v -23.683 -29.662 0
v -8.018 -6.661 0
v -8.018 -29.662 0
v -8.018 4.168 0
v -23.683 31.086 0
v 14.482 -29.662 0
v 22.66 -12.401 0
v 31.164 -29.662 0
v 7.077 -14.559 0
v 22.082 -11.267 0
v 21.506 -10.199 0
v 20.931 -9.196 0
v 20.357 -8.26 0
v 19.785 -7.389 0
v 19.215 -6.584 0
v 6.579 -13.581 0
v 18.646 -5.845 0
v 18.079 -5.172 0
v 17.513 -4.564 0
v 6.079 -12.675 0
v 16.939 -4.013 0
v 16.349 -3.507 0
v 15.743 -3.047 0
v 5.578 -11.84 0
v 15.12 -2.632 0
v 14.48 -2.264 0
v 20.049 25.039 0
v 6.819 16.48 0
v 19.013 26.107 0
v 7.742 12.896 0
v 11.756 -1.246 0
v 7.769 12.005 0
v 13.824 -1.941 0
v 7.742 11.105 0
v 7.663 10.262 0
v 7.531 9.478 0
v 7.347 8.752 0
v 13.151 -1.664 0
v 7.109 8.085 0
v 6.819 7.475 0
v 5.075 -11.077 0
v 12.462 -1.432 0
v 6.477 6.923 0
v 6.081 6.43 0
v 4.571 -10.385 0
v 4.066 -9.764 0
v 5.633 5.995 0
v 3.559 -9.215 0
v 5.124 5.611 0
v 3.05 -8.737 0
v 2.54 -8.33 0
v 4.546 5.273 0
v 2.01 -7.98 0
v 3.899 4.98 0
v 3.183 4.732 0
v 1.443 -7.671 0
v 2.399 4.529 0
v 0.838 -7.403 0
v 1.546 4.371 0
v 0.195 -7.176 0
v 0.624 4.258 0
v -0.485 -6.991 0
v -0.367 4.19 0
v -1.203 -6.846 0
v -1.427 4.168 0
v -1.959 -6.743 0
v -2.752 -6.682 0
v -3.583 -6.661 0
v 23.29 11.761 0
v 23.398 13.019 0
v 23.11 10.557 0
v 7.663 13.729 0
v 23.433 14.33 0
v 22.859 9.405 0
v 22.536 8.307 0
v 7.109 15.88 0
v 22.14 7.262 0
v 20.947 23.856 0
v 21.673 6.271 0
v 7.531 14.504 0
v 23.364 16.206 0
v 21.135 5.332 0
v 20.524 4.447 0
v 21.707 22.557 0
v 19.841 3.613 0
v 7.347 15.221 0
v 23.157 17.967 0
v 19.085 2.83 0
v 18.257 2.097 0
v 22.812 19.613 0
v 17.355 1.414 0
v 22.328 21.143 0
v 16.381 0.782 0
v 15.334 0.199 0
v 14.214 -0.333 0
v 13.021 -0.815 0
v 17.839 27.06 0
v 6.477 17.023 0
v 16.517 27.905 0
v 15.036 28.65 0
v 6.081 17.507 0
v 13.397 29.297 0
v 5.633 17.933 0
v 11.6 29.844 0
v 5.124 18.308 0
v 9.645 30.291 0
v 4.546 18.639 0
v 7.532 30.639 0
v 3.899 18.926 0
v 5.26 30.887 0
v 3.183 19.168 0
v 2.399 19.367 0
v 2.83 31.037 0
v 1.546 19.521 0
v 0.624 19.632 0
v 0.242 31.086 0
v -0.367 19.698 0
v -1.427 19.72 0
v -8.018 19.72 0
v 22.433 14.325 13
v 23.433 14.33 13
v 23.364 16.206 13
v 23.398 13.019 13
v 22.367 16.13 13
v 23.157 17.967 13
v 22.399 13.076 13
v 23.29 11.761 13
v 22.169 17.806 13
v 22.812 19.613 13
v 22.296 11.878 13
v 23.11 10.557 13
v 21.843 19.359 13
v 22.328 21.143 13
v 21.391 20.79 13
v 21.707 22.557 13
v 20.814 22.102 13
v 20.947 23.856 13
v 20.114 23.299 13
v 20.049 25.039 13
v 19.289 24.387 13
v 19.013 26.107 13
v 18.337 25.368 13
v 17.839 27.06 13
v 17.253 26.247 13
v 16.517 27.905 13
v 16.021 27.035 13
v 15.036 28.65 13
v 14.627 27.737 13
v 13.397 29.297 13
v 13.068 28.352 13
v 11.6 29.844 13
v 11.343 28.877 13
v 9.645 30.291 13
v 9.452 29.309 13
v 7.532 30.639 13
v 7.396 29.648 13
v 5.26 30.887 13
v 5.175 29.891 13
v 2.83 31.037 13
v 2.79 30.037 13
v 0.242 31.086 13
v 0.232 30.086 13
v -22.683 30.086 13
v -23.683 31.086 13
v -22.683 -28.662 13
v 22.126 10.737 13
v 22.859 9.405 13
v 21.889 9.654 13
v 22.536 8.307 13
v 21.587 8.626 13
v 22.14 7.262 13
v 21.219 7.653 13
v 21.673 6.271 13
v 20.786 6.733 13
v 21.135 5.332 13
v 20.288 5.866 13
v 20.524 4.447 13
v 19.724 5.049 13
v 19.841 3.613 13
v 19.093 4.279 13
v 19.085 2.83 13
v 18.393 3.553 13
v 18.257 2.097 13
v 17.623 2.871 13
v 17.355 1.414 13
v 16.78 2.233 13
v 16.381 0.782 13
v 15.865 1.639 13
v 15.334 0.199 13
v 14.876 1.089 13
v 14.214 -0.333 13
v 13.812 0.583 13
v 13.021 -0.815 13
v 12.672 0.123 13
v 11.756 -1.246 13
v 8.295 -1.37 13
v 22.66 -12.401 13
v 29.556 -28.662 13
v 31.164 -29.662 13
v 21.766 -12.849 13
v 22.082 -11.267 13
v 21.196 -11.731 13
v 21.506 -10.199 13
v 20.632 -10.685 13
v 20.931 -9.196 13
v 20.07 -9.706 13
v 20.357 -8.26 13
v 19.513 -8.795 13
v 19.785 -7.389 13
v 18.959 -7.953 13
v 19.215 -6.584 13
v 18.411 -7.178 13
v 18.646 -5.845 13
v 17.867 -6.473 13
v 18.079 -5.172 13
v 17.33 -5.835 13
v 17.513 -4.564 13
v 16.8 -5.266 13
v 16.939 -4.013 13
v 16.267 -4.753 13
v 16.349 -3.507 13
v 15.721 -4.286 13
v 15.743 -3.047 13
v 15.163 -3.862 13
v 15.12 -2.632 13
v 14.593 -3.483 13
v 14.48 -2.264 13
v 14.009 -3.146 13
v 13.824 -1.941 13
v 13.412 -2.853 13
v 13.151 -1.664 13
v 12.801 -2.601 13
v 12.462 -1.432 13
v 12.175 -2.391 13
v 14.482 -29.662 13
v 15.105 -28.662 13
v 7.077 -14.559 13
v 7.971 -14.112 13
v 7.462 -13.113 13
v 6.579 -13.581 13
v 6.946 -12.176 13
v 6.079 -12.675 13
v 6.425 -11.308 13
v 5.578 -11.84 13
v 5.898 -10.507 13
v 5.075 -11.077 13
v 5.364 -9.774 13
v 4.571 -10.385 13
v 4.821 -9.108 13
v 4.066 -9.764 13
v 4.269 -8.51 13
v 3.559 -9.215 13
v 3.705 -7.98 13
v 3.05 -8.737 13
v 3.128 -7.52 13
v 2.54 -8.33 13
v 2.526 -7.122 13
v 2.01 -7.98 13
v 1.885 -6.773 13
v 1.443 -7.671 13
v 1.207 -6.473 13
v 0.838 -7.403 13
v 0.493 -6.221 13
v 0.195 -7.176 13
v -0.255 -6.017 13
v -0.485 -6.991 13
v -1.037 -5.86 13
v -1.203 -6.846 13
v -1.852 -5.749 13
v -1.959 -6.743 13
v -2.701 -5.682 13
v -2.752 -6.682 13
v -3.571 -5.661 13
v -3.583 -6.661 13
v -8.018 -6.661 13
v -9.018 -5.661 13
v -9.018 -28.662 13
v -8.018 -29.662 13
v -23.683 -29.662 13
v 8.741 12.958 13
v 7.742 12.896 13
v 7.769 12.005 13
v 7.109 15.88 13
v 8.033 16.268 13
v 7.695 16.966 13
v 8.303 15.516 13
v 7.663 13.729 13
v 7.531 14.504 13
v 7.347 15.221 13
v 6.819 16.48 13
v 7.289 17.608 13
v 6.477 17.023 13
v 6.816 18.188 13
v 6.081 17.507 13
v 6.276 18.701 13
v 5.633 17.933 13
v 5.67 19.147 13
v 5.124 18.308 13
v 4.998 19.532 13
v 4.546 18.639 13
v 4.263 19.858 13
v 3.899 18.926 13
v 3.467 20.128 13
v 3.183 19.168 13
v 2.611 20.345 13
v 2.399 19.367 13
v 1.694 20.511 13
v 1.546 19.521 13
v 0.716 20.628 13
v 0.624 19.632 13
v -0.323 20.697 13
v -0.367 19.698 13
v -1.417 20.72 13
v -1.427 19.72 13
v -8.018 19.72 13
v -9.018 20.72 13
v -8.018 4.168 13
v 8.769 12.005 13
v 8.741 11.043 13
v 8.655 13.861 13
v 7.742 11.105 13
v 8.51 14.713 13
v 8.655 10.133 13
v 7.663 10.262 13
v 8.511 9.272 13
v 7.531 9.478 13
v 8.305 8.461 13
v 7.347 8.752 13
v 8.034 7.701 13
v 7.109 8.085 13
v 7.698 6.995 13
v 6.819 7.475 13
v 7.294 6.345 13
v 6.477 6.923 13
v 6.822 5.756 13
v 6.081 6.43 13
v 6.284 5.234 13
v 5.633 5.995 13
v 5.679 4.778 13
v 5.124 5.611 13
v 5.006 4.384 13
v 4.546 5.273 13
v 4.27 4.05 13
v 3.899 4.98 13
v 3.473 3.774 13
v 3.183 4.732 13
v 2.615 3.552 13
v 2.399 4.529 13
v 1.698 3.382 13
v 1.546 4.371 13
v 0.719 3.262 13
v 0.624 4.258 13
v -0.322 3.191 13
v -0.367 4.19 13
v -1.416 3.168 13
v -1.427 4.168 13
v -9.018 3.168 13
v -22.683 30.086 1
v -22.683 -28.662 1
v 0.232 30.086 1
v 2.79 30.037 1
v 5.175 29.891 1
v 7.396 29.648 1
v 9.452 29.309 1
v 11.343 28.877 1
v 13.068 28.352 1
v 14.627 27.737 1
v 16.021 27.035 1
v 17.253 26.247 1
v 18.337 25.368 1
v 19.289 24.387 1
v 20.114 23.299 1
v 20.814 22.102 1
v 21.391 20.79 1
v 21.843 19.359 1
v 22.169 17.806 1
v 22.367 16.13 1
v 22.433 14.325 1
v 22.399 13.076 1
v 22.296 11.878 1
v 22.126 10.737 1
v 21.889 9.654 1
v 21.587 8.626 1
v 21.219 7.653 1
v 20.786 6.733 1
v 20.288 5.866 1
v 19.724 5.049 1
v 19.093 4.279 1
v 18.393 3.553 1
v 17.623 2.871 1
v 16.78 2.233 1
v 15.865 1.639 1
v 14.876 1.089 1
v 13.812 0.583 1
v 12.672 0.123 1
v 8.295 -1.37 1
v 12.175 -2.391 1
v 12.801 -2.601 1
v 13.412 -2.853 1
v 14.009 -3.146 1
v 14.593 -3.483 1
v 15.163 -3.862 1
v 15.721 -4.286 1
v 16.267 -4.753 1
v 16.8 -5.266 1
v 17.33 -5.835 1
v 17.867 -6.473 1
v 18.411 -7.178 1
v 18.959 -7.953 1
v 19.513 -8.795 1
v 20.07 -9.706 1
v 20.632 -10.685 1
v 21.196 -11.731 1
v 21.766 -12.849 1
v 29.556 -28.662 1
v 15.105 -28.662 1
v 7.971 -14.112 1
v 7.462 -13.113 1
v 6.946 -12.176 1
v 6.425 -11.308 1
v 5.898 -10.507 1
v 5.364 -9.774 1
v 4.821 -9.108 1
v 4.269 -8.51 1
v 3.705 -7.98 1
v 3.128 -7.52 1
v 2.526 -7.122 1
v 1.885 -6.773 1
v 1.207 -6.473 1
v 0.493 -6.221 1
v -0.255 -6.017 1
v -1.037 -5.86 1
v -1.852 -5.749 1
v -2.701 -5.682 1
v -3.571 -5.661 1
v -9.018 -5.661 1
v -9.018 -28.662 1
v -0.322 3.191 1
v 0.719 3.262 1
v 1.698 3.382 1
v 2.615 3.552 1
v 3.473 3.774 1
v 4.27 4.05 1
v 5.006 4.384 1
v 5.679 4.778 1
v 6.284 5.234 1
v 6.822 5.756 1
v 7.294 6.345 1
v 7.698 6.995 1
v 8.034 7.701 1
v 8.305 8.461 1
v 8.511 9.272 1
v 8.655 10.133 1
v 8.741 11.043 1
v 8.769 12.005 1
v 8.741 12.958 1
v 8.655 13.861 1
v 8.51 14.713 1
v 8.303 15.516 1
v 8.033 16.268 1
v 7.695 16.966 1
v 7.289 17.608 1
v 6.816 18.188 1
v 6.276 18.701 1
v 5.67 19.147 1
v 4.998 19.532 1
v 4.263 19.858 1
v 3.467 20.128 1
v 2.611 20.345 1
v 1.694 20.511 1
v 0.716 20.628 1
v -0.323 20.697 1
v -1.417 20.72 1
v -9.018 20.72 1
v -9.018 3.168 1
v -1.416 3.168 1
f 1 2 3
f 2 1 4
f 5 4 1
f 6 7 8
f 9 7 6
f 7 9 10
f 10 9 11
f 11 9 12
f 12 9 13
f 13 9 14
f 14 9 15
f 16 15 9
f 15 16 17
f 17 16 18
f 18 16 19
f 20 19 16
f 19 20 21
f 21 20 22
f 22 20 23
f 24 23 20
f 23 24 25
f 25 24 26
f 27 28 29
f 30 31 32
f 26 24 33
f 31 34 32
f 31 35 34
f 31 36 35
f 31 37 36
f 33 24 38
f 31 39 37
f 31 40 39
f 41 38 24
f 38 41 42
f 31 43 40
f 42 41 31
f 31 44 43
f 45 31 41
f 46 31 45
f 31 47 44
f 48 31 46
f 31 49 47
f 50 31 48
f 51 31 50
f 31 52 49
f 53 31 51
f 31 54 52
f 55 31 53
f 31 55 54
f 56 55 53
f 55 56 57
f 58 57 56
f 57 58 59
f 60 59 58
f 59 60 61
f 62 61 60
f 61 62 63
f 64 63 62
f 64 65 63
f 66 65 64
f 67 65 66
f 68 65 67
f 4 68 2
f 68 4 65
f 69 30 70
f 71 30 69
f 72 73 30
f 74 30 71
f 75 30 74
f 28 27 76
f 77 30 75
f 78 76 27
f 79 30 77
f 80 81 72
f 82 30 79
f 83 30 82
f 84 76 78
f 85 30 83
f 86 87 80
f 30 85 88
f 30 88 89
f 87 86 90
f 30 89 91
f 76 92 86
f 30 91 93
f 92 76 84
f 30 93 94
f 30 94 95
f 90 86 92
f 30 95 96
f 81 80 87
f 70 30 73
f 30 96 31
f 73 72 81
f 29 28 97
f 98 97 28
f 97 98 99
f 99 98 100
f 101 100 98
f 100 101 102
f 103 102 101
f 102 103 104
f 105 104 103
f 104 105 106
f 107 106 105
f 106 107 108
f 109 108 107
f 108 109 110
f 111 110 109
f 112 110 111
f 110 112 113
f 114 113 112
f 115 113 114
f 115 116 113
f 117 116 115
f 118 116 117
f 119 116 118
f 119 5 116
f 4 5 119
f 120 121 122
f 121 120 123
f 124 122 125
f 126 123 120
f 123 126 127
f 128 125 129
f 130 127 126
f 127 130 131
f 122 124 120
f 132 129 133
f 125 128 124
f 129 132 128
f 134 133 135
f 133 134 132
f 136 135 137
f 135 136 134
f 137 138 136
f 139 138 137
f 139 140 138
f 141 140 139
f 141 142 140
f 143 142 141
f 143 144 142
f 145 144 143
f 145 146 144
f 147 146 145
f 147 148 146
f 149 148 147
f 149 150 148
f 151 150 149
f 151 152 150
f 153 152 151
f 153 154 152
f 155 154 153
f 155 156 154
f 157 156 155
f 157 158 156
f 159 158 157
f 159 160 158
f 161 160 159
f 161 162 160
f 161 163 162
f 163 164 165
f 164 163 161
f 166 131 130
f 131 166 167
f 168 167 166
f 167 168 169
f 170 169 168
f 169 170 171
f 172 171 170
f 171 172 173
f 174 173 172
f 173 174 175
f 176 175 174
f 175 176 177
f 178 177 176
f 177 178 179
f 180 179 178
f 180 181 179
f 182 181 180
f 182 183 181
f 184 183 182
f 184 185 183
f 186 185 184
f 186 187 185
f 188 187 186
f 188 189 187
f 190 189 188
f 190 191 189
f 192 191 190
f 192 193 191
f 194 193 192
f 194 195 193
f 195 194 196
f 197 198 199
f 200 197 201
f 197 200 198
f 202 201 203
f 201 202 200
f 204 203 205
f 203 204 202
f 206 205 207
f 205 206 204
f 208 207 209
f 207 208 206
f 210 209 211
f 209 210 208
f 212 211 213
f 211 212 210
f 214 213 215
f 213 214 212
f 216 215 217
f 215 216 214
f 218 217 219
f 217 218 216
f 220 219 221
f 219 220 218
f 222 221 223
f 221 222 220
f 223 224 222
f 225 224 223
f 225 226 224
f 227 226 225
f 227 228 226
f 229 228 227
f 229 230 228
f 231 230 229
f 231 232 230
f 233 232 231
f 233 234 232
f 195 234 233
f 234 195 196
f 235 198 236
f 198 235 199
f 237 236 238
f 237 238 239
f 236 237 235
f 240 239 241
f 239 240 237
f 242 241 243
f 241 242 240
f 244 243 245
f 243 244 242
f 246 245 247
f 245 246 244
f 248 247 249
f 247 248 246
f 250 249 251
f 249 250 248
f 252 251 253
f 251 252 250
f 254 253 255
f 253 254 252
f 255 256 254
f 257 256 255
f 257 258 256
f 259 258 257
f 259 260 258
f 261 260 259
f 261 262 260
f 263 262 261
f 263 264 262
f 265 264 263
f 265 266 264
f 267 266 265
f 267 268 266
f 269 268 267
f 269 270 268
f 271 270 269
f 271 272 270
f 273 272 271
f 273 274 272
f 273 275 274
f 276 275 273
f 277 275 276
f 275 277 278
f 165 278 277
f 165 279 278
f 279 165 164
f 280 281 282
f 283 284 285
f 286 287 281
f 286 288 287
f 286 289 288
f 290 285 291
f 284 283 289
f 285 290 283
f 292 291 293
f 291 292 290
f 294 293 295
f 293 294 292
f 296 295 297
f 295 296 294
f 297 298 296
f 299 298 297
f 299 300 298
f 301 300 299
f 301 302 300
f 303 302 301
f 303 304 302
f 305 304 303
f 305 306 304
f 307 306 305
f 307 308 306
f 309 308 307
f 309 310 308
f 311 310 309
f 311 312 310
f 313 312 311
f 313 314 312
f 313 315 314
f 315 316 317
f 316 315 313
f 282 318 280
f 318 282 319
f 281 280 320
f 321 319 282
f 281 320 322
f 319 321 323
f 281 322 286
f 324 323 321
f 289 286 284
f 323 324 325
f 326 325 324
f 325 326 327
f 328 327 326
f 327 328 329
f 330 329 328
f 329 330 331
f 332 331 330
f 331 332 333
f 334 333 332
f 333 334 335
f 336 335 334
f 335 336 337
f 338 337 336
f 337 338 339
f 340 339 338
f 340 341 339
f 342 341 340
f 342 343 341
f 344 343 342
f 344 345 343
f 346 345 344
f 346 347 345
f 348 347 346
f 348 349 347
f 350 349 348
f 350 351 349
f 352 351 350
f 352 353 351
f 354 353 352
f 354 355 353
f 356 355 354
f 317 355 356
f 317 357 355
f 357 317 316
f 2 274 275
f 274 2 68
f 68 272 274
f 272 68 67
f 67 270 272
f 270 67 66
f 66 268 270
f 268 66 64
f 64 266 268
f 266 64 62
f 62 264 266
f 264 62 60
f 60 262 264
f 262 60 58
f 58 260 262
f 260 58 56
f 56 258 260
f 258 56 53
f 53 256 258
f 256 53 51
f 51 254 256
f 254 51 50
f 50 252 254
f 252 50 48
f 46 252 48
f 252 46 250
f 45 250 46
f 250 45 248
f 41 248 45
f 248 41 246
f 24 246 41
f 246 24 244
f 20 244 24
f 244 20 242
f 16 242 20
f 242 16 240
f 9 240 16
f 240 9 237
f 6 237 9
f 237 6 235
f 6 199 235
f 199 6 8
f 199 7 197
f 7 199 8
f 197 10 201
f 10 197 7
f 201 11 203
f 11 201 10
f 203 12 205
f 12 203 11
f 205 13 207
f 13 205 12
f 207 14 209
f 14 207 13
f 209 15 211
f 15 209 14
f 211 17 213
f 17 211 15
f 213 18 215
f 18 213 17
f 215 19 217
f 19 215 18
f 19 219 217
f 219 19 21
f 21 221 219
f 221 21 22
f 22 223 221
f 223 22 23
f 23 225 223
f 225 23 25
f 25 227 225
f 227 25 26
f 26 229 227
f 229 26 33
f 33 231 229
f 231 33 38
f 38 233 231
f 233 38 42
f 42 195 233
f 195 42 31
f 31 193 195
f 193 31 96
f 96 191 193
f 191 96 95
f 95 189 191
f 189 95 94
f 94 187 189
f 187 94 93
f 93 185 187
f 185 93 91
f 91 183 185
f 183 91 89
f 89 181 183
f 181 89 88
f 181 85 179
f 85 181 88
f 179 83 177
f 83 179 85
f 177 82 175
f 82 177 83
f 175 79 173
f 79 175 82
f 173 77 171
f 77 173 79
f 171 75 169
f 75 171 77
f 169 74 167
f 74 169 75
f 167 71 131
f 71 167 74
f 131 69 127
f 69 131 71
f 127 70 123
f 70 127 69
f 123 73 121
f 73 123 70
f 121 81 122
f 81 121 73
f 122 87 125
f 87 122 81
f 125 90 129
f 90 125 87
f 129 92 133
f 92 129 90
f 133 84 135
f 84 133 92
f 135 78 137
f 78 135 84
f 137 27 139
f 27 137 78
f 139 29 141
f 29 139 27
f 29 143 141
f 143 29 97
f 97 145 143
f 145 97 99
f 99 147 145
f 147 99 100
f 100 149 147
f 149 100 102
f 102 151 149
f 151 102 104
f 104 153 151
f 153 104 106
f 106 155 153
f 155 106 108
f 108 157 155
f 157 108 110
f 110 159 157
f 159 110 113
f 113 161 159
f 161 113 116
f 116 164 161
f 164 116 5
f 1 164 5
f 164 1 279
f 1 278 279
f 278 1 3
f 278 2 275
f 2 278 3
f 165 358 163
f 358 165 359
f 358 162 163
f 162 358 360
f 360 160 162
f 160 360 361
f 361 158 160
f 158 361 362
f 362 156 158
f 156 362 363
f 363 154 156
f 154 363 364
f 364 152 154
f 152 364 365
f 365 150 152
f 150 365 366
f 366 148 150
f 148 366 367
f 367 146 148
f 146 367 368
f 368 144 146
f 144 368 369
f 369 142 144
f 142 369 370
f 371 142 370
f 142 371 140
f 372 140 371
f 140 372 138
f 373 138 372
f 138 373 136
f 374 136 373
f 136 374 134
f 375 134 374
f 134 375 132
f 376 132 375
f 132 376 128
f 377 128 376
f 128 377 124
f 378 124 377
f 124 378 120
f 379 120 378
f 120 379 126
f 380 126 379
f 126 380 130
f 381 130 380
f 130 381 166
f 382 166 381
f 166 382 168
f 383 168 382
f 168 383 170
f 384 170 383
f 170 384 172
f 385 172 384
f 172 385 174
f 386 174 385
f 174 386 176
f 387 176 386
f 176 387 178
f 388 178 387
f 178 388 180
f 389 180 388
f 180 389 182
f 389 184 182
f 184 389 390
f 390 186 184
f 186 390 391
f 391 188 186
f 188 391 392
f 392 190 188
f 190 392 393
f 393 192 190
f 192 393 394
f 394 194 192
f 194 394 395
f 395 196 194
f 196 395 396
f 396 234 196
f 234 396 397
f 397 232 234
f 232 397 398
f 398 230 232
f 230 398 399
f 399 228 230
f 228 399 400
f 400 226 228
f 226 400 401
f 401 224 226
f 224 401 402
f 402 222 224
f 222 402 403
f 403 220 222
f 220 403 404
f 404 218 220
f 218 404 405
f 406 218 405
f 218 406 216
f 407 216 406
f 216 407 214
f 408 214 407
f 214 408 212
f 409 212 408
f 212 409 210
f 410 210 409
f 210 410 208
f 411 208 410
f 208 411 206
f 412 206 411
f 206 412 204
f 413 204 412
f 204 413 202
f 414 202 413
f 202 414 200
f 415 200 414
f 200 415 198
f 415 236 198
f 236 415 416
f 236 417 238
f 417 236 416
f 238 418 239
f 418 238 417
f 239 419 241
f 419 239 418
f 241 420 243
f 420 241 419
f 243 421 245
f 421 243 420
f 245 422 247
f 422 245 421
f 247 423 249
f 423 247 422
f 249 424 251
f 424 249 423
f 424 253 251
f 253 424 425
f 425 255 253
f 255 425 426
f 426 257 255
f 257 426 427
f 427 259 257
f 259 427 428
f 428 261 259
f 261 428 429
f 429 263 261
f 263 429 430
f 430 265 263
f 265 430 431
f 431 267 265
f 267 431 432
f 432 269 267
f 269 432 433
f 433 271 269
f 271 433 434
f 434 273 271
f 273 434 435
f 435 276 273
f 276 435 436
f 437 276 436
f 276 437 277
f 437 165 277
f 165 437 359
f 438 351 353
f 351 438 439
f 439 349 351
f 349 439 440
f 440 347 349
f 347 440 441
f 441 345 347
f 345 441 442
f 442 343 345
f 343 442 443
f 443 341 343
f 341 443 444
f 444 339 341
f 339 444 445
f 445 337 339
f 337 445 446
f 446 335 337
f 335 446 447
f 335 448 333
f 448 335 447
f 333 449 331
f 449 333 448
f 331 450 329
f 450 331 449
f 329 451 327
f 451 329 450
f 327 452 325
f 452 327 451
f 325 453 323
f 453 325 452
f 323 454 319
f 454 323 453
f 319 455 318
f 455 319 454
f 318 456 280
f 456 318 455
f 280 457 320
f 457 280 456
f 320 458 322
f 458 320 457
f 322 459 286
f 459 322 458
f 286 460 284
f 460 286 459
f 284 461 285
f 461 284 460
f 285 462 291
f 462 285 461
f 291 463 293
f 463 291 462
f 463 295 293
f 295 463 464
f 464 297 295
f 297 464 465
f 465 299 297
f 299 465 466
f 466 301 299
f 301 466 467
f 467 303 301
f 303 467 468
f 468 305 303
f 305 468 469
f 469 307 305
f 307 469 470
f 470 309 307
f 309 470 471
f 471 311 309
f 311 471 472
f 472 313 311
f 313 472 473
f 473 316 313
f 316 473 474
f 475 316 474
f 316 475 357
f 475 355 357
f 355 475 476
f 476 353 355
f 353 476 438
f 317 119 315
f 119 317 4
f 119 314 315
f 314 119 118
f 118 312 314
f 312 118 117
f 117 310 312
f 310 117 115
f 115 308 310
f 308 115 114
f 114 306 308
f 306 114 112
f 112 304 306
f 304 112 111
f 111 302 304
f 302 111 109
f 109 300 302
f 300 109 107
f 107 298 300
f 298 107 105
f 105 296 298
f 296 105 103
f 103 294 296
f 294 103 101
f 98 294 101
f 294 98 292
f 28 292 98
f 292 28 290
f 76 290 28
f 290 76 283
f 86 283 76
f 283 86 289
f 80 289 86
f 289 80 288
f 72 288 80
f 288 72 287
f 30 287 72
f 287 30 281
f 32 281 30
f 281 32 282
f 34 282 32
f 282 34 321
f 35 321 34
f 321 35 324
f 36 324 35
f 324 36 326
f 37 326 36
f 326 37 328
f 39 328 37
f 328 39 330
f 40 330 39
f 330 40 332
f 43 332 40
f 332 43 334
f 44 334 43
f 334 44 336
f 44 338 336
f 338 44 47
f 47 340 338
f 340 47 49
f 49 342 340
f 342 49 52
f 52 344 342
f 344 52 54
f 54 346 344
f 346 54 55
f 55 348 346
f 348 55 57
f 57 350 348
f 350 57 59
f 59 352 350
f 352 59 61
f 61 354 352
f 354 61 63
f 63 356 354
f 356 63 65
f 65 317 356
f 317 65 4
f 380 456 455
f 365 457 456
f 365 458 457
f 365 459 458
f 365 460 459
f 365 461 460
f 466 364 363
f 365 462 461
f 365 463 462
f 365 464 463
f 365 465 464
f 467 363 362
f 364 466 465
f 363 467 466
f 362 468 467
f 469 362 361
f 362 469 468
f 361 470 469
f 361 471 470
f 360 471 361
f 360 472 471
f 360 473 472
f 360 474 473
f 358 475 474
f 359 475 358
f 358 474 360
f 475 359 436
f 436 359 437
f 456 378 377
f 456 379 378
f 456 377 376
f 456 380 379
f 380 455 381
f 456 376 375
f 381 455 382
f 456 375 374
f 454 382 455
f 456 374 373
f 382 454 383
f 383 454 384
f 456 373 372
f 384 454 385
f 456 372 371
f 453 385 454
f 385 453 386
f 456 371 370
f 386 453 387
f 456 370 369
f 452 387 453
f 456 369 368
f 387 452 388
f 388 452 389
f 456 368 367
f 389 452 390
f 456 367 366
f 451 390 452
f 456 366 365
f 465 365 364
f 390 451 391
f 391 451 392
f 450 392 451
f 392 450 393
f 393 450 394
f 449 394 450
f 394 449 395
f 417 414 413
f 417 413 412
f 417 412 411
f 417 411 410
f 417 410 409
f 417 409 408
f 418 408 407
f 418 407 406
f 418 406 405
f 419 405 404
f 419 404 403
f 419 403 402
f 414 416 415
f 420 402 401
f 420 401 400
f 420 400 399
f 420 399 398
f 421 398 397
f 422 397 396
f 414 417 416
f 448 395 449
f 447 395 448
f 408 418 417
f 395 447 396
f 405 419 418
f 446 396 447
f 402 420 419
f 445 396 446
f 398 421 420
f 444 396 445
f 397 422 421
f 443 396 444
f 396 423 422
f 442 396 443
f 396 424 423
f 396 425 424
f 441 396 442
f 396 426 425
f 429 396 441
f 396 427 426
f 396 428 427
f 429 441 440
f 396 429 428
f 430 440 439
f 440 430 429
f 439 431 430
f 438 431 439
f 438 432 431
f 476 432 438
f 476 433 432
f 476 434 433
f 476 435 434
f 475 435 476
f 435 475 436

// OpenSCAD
font = "DejaVu Sans:style=Bold";
letter_size = 60;
height = 13;
string = "R";
offset_amount = 1; // Adjust for desired outline thickness


linear_extrude(height = height)
  difference() {
    text(string, size = letter_size, font = font, halign = "center", valign = "center", $fn = 64);

    offset(delta = -offset_amount) { // Negative offset for internal outline
      text(string, size = letter_size, font = font, halign = "center", valign = "center", $fn = 64);
    }

  }
linear_extrude(height = 1)
  text(string, size = letter_size, font = font, halign = "center", valign = "center", $fn = 64);
